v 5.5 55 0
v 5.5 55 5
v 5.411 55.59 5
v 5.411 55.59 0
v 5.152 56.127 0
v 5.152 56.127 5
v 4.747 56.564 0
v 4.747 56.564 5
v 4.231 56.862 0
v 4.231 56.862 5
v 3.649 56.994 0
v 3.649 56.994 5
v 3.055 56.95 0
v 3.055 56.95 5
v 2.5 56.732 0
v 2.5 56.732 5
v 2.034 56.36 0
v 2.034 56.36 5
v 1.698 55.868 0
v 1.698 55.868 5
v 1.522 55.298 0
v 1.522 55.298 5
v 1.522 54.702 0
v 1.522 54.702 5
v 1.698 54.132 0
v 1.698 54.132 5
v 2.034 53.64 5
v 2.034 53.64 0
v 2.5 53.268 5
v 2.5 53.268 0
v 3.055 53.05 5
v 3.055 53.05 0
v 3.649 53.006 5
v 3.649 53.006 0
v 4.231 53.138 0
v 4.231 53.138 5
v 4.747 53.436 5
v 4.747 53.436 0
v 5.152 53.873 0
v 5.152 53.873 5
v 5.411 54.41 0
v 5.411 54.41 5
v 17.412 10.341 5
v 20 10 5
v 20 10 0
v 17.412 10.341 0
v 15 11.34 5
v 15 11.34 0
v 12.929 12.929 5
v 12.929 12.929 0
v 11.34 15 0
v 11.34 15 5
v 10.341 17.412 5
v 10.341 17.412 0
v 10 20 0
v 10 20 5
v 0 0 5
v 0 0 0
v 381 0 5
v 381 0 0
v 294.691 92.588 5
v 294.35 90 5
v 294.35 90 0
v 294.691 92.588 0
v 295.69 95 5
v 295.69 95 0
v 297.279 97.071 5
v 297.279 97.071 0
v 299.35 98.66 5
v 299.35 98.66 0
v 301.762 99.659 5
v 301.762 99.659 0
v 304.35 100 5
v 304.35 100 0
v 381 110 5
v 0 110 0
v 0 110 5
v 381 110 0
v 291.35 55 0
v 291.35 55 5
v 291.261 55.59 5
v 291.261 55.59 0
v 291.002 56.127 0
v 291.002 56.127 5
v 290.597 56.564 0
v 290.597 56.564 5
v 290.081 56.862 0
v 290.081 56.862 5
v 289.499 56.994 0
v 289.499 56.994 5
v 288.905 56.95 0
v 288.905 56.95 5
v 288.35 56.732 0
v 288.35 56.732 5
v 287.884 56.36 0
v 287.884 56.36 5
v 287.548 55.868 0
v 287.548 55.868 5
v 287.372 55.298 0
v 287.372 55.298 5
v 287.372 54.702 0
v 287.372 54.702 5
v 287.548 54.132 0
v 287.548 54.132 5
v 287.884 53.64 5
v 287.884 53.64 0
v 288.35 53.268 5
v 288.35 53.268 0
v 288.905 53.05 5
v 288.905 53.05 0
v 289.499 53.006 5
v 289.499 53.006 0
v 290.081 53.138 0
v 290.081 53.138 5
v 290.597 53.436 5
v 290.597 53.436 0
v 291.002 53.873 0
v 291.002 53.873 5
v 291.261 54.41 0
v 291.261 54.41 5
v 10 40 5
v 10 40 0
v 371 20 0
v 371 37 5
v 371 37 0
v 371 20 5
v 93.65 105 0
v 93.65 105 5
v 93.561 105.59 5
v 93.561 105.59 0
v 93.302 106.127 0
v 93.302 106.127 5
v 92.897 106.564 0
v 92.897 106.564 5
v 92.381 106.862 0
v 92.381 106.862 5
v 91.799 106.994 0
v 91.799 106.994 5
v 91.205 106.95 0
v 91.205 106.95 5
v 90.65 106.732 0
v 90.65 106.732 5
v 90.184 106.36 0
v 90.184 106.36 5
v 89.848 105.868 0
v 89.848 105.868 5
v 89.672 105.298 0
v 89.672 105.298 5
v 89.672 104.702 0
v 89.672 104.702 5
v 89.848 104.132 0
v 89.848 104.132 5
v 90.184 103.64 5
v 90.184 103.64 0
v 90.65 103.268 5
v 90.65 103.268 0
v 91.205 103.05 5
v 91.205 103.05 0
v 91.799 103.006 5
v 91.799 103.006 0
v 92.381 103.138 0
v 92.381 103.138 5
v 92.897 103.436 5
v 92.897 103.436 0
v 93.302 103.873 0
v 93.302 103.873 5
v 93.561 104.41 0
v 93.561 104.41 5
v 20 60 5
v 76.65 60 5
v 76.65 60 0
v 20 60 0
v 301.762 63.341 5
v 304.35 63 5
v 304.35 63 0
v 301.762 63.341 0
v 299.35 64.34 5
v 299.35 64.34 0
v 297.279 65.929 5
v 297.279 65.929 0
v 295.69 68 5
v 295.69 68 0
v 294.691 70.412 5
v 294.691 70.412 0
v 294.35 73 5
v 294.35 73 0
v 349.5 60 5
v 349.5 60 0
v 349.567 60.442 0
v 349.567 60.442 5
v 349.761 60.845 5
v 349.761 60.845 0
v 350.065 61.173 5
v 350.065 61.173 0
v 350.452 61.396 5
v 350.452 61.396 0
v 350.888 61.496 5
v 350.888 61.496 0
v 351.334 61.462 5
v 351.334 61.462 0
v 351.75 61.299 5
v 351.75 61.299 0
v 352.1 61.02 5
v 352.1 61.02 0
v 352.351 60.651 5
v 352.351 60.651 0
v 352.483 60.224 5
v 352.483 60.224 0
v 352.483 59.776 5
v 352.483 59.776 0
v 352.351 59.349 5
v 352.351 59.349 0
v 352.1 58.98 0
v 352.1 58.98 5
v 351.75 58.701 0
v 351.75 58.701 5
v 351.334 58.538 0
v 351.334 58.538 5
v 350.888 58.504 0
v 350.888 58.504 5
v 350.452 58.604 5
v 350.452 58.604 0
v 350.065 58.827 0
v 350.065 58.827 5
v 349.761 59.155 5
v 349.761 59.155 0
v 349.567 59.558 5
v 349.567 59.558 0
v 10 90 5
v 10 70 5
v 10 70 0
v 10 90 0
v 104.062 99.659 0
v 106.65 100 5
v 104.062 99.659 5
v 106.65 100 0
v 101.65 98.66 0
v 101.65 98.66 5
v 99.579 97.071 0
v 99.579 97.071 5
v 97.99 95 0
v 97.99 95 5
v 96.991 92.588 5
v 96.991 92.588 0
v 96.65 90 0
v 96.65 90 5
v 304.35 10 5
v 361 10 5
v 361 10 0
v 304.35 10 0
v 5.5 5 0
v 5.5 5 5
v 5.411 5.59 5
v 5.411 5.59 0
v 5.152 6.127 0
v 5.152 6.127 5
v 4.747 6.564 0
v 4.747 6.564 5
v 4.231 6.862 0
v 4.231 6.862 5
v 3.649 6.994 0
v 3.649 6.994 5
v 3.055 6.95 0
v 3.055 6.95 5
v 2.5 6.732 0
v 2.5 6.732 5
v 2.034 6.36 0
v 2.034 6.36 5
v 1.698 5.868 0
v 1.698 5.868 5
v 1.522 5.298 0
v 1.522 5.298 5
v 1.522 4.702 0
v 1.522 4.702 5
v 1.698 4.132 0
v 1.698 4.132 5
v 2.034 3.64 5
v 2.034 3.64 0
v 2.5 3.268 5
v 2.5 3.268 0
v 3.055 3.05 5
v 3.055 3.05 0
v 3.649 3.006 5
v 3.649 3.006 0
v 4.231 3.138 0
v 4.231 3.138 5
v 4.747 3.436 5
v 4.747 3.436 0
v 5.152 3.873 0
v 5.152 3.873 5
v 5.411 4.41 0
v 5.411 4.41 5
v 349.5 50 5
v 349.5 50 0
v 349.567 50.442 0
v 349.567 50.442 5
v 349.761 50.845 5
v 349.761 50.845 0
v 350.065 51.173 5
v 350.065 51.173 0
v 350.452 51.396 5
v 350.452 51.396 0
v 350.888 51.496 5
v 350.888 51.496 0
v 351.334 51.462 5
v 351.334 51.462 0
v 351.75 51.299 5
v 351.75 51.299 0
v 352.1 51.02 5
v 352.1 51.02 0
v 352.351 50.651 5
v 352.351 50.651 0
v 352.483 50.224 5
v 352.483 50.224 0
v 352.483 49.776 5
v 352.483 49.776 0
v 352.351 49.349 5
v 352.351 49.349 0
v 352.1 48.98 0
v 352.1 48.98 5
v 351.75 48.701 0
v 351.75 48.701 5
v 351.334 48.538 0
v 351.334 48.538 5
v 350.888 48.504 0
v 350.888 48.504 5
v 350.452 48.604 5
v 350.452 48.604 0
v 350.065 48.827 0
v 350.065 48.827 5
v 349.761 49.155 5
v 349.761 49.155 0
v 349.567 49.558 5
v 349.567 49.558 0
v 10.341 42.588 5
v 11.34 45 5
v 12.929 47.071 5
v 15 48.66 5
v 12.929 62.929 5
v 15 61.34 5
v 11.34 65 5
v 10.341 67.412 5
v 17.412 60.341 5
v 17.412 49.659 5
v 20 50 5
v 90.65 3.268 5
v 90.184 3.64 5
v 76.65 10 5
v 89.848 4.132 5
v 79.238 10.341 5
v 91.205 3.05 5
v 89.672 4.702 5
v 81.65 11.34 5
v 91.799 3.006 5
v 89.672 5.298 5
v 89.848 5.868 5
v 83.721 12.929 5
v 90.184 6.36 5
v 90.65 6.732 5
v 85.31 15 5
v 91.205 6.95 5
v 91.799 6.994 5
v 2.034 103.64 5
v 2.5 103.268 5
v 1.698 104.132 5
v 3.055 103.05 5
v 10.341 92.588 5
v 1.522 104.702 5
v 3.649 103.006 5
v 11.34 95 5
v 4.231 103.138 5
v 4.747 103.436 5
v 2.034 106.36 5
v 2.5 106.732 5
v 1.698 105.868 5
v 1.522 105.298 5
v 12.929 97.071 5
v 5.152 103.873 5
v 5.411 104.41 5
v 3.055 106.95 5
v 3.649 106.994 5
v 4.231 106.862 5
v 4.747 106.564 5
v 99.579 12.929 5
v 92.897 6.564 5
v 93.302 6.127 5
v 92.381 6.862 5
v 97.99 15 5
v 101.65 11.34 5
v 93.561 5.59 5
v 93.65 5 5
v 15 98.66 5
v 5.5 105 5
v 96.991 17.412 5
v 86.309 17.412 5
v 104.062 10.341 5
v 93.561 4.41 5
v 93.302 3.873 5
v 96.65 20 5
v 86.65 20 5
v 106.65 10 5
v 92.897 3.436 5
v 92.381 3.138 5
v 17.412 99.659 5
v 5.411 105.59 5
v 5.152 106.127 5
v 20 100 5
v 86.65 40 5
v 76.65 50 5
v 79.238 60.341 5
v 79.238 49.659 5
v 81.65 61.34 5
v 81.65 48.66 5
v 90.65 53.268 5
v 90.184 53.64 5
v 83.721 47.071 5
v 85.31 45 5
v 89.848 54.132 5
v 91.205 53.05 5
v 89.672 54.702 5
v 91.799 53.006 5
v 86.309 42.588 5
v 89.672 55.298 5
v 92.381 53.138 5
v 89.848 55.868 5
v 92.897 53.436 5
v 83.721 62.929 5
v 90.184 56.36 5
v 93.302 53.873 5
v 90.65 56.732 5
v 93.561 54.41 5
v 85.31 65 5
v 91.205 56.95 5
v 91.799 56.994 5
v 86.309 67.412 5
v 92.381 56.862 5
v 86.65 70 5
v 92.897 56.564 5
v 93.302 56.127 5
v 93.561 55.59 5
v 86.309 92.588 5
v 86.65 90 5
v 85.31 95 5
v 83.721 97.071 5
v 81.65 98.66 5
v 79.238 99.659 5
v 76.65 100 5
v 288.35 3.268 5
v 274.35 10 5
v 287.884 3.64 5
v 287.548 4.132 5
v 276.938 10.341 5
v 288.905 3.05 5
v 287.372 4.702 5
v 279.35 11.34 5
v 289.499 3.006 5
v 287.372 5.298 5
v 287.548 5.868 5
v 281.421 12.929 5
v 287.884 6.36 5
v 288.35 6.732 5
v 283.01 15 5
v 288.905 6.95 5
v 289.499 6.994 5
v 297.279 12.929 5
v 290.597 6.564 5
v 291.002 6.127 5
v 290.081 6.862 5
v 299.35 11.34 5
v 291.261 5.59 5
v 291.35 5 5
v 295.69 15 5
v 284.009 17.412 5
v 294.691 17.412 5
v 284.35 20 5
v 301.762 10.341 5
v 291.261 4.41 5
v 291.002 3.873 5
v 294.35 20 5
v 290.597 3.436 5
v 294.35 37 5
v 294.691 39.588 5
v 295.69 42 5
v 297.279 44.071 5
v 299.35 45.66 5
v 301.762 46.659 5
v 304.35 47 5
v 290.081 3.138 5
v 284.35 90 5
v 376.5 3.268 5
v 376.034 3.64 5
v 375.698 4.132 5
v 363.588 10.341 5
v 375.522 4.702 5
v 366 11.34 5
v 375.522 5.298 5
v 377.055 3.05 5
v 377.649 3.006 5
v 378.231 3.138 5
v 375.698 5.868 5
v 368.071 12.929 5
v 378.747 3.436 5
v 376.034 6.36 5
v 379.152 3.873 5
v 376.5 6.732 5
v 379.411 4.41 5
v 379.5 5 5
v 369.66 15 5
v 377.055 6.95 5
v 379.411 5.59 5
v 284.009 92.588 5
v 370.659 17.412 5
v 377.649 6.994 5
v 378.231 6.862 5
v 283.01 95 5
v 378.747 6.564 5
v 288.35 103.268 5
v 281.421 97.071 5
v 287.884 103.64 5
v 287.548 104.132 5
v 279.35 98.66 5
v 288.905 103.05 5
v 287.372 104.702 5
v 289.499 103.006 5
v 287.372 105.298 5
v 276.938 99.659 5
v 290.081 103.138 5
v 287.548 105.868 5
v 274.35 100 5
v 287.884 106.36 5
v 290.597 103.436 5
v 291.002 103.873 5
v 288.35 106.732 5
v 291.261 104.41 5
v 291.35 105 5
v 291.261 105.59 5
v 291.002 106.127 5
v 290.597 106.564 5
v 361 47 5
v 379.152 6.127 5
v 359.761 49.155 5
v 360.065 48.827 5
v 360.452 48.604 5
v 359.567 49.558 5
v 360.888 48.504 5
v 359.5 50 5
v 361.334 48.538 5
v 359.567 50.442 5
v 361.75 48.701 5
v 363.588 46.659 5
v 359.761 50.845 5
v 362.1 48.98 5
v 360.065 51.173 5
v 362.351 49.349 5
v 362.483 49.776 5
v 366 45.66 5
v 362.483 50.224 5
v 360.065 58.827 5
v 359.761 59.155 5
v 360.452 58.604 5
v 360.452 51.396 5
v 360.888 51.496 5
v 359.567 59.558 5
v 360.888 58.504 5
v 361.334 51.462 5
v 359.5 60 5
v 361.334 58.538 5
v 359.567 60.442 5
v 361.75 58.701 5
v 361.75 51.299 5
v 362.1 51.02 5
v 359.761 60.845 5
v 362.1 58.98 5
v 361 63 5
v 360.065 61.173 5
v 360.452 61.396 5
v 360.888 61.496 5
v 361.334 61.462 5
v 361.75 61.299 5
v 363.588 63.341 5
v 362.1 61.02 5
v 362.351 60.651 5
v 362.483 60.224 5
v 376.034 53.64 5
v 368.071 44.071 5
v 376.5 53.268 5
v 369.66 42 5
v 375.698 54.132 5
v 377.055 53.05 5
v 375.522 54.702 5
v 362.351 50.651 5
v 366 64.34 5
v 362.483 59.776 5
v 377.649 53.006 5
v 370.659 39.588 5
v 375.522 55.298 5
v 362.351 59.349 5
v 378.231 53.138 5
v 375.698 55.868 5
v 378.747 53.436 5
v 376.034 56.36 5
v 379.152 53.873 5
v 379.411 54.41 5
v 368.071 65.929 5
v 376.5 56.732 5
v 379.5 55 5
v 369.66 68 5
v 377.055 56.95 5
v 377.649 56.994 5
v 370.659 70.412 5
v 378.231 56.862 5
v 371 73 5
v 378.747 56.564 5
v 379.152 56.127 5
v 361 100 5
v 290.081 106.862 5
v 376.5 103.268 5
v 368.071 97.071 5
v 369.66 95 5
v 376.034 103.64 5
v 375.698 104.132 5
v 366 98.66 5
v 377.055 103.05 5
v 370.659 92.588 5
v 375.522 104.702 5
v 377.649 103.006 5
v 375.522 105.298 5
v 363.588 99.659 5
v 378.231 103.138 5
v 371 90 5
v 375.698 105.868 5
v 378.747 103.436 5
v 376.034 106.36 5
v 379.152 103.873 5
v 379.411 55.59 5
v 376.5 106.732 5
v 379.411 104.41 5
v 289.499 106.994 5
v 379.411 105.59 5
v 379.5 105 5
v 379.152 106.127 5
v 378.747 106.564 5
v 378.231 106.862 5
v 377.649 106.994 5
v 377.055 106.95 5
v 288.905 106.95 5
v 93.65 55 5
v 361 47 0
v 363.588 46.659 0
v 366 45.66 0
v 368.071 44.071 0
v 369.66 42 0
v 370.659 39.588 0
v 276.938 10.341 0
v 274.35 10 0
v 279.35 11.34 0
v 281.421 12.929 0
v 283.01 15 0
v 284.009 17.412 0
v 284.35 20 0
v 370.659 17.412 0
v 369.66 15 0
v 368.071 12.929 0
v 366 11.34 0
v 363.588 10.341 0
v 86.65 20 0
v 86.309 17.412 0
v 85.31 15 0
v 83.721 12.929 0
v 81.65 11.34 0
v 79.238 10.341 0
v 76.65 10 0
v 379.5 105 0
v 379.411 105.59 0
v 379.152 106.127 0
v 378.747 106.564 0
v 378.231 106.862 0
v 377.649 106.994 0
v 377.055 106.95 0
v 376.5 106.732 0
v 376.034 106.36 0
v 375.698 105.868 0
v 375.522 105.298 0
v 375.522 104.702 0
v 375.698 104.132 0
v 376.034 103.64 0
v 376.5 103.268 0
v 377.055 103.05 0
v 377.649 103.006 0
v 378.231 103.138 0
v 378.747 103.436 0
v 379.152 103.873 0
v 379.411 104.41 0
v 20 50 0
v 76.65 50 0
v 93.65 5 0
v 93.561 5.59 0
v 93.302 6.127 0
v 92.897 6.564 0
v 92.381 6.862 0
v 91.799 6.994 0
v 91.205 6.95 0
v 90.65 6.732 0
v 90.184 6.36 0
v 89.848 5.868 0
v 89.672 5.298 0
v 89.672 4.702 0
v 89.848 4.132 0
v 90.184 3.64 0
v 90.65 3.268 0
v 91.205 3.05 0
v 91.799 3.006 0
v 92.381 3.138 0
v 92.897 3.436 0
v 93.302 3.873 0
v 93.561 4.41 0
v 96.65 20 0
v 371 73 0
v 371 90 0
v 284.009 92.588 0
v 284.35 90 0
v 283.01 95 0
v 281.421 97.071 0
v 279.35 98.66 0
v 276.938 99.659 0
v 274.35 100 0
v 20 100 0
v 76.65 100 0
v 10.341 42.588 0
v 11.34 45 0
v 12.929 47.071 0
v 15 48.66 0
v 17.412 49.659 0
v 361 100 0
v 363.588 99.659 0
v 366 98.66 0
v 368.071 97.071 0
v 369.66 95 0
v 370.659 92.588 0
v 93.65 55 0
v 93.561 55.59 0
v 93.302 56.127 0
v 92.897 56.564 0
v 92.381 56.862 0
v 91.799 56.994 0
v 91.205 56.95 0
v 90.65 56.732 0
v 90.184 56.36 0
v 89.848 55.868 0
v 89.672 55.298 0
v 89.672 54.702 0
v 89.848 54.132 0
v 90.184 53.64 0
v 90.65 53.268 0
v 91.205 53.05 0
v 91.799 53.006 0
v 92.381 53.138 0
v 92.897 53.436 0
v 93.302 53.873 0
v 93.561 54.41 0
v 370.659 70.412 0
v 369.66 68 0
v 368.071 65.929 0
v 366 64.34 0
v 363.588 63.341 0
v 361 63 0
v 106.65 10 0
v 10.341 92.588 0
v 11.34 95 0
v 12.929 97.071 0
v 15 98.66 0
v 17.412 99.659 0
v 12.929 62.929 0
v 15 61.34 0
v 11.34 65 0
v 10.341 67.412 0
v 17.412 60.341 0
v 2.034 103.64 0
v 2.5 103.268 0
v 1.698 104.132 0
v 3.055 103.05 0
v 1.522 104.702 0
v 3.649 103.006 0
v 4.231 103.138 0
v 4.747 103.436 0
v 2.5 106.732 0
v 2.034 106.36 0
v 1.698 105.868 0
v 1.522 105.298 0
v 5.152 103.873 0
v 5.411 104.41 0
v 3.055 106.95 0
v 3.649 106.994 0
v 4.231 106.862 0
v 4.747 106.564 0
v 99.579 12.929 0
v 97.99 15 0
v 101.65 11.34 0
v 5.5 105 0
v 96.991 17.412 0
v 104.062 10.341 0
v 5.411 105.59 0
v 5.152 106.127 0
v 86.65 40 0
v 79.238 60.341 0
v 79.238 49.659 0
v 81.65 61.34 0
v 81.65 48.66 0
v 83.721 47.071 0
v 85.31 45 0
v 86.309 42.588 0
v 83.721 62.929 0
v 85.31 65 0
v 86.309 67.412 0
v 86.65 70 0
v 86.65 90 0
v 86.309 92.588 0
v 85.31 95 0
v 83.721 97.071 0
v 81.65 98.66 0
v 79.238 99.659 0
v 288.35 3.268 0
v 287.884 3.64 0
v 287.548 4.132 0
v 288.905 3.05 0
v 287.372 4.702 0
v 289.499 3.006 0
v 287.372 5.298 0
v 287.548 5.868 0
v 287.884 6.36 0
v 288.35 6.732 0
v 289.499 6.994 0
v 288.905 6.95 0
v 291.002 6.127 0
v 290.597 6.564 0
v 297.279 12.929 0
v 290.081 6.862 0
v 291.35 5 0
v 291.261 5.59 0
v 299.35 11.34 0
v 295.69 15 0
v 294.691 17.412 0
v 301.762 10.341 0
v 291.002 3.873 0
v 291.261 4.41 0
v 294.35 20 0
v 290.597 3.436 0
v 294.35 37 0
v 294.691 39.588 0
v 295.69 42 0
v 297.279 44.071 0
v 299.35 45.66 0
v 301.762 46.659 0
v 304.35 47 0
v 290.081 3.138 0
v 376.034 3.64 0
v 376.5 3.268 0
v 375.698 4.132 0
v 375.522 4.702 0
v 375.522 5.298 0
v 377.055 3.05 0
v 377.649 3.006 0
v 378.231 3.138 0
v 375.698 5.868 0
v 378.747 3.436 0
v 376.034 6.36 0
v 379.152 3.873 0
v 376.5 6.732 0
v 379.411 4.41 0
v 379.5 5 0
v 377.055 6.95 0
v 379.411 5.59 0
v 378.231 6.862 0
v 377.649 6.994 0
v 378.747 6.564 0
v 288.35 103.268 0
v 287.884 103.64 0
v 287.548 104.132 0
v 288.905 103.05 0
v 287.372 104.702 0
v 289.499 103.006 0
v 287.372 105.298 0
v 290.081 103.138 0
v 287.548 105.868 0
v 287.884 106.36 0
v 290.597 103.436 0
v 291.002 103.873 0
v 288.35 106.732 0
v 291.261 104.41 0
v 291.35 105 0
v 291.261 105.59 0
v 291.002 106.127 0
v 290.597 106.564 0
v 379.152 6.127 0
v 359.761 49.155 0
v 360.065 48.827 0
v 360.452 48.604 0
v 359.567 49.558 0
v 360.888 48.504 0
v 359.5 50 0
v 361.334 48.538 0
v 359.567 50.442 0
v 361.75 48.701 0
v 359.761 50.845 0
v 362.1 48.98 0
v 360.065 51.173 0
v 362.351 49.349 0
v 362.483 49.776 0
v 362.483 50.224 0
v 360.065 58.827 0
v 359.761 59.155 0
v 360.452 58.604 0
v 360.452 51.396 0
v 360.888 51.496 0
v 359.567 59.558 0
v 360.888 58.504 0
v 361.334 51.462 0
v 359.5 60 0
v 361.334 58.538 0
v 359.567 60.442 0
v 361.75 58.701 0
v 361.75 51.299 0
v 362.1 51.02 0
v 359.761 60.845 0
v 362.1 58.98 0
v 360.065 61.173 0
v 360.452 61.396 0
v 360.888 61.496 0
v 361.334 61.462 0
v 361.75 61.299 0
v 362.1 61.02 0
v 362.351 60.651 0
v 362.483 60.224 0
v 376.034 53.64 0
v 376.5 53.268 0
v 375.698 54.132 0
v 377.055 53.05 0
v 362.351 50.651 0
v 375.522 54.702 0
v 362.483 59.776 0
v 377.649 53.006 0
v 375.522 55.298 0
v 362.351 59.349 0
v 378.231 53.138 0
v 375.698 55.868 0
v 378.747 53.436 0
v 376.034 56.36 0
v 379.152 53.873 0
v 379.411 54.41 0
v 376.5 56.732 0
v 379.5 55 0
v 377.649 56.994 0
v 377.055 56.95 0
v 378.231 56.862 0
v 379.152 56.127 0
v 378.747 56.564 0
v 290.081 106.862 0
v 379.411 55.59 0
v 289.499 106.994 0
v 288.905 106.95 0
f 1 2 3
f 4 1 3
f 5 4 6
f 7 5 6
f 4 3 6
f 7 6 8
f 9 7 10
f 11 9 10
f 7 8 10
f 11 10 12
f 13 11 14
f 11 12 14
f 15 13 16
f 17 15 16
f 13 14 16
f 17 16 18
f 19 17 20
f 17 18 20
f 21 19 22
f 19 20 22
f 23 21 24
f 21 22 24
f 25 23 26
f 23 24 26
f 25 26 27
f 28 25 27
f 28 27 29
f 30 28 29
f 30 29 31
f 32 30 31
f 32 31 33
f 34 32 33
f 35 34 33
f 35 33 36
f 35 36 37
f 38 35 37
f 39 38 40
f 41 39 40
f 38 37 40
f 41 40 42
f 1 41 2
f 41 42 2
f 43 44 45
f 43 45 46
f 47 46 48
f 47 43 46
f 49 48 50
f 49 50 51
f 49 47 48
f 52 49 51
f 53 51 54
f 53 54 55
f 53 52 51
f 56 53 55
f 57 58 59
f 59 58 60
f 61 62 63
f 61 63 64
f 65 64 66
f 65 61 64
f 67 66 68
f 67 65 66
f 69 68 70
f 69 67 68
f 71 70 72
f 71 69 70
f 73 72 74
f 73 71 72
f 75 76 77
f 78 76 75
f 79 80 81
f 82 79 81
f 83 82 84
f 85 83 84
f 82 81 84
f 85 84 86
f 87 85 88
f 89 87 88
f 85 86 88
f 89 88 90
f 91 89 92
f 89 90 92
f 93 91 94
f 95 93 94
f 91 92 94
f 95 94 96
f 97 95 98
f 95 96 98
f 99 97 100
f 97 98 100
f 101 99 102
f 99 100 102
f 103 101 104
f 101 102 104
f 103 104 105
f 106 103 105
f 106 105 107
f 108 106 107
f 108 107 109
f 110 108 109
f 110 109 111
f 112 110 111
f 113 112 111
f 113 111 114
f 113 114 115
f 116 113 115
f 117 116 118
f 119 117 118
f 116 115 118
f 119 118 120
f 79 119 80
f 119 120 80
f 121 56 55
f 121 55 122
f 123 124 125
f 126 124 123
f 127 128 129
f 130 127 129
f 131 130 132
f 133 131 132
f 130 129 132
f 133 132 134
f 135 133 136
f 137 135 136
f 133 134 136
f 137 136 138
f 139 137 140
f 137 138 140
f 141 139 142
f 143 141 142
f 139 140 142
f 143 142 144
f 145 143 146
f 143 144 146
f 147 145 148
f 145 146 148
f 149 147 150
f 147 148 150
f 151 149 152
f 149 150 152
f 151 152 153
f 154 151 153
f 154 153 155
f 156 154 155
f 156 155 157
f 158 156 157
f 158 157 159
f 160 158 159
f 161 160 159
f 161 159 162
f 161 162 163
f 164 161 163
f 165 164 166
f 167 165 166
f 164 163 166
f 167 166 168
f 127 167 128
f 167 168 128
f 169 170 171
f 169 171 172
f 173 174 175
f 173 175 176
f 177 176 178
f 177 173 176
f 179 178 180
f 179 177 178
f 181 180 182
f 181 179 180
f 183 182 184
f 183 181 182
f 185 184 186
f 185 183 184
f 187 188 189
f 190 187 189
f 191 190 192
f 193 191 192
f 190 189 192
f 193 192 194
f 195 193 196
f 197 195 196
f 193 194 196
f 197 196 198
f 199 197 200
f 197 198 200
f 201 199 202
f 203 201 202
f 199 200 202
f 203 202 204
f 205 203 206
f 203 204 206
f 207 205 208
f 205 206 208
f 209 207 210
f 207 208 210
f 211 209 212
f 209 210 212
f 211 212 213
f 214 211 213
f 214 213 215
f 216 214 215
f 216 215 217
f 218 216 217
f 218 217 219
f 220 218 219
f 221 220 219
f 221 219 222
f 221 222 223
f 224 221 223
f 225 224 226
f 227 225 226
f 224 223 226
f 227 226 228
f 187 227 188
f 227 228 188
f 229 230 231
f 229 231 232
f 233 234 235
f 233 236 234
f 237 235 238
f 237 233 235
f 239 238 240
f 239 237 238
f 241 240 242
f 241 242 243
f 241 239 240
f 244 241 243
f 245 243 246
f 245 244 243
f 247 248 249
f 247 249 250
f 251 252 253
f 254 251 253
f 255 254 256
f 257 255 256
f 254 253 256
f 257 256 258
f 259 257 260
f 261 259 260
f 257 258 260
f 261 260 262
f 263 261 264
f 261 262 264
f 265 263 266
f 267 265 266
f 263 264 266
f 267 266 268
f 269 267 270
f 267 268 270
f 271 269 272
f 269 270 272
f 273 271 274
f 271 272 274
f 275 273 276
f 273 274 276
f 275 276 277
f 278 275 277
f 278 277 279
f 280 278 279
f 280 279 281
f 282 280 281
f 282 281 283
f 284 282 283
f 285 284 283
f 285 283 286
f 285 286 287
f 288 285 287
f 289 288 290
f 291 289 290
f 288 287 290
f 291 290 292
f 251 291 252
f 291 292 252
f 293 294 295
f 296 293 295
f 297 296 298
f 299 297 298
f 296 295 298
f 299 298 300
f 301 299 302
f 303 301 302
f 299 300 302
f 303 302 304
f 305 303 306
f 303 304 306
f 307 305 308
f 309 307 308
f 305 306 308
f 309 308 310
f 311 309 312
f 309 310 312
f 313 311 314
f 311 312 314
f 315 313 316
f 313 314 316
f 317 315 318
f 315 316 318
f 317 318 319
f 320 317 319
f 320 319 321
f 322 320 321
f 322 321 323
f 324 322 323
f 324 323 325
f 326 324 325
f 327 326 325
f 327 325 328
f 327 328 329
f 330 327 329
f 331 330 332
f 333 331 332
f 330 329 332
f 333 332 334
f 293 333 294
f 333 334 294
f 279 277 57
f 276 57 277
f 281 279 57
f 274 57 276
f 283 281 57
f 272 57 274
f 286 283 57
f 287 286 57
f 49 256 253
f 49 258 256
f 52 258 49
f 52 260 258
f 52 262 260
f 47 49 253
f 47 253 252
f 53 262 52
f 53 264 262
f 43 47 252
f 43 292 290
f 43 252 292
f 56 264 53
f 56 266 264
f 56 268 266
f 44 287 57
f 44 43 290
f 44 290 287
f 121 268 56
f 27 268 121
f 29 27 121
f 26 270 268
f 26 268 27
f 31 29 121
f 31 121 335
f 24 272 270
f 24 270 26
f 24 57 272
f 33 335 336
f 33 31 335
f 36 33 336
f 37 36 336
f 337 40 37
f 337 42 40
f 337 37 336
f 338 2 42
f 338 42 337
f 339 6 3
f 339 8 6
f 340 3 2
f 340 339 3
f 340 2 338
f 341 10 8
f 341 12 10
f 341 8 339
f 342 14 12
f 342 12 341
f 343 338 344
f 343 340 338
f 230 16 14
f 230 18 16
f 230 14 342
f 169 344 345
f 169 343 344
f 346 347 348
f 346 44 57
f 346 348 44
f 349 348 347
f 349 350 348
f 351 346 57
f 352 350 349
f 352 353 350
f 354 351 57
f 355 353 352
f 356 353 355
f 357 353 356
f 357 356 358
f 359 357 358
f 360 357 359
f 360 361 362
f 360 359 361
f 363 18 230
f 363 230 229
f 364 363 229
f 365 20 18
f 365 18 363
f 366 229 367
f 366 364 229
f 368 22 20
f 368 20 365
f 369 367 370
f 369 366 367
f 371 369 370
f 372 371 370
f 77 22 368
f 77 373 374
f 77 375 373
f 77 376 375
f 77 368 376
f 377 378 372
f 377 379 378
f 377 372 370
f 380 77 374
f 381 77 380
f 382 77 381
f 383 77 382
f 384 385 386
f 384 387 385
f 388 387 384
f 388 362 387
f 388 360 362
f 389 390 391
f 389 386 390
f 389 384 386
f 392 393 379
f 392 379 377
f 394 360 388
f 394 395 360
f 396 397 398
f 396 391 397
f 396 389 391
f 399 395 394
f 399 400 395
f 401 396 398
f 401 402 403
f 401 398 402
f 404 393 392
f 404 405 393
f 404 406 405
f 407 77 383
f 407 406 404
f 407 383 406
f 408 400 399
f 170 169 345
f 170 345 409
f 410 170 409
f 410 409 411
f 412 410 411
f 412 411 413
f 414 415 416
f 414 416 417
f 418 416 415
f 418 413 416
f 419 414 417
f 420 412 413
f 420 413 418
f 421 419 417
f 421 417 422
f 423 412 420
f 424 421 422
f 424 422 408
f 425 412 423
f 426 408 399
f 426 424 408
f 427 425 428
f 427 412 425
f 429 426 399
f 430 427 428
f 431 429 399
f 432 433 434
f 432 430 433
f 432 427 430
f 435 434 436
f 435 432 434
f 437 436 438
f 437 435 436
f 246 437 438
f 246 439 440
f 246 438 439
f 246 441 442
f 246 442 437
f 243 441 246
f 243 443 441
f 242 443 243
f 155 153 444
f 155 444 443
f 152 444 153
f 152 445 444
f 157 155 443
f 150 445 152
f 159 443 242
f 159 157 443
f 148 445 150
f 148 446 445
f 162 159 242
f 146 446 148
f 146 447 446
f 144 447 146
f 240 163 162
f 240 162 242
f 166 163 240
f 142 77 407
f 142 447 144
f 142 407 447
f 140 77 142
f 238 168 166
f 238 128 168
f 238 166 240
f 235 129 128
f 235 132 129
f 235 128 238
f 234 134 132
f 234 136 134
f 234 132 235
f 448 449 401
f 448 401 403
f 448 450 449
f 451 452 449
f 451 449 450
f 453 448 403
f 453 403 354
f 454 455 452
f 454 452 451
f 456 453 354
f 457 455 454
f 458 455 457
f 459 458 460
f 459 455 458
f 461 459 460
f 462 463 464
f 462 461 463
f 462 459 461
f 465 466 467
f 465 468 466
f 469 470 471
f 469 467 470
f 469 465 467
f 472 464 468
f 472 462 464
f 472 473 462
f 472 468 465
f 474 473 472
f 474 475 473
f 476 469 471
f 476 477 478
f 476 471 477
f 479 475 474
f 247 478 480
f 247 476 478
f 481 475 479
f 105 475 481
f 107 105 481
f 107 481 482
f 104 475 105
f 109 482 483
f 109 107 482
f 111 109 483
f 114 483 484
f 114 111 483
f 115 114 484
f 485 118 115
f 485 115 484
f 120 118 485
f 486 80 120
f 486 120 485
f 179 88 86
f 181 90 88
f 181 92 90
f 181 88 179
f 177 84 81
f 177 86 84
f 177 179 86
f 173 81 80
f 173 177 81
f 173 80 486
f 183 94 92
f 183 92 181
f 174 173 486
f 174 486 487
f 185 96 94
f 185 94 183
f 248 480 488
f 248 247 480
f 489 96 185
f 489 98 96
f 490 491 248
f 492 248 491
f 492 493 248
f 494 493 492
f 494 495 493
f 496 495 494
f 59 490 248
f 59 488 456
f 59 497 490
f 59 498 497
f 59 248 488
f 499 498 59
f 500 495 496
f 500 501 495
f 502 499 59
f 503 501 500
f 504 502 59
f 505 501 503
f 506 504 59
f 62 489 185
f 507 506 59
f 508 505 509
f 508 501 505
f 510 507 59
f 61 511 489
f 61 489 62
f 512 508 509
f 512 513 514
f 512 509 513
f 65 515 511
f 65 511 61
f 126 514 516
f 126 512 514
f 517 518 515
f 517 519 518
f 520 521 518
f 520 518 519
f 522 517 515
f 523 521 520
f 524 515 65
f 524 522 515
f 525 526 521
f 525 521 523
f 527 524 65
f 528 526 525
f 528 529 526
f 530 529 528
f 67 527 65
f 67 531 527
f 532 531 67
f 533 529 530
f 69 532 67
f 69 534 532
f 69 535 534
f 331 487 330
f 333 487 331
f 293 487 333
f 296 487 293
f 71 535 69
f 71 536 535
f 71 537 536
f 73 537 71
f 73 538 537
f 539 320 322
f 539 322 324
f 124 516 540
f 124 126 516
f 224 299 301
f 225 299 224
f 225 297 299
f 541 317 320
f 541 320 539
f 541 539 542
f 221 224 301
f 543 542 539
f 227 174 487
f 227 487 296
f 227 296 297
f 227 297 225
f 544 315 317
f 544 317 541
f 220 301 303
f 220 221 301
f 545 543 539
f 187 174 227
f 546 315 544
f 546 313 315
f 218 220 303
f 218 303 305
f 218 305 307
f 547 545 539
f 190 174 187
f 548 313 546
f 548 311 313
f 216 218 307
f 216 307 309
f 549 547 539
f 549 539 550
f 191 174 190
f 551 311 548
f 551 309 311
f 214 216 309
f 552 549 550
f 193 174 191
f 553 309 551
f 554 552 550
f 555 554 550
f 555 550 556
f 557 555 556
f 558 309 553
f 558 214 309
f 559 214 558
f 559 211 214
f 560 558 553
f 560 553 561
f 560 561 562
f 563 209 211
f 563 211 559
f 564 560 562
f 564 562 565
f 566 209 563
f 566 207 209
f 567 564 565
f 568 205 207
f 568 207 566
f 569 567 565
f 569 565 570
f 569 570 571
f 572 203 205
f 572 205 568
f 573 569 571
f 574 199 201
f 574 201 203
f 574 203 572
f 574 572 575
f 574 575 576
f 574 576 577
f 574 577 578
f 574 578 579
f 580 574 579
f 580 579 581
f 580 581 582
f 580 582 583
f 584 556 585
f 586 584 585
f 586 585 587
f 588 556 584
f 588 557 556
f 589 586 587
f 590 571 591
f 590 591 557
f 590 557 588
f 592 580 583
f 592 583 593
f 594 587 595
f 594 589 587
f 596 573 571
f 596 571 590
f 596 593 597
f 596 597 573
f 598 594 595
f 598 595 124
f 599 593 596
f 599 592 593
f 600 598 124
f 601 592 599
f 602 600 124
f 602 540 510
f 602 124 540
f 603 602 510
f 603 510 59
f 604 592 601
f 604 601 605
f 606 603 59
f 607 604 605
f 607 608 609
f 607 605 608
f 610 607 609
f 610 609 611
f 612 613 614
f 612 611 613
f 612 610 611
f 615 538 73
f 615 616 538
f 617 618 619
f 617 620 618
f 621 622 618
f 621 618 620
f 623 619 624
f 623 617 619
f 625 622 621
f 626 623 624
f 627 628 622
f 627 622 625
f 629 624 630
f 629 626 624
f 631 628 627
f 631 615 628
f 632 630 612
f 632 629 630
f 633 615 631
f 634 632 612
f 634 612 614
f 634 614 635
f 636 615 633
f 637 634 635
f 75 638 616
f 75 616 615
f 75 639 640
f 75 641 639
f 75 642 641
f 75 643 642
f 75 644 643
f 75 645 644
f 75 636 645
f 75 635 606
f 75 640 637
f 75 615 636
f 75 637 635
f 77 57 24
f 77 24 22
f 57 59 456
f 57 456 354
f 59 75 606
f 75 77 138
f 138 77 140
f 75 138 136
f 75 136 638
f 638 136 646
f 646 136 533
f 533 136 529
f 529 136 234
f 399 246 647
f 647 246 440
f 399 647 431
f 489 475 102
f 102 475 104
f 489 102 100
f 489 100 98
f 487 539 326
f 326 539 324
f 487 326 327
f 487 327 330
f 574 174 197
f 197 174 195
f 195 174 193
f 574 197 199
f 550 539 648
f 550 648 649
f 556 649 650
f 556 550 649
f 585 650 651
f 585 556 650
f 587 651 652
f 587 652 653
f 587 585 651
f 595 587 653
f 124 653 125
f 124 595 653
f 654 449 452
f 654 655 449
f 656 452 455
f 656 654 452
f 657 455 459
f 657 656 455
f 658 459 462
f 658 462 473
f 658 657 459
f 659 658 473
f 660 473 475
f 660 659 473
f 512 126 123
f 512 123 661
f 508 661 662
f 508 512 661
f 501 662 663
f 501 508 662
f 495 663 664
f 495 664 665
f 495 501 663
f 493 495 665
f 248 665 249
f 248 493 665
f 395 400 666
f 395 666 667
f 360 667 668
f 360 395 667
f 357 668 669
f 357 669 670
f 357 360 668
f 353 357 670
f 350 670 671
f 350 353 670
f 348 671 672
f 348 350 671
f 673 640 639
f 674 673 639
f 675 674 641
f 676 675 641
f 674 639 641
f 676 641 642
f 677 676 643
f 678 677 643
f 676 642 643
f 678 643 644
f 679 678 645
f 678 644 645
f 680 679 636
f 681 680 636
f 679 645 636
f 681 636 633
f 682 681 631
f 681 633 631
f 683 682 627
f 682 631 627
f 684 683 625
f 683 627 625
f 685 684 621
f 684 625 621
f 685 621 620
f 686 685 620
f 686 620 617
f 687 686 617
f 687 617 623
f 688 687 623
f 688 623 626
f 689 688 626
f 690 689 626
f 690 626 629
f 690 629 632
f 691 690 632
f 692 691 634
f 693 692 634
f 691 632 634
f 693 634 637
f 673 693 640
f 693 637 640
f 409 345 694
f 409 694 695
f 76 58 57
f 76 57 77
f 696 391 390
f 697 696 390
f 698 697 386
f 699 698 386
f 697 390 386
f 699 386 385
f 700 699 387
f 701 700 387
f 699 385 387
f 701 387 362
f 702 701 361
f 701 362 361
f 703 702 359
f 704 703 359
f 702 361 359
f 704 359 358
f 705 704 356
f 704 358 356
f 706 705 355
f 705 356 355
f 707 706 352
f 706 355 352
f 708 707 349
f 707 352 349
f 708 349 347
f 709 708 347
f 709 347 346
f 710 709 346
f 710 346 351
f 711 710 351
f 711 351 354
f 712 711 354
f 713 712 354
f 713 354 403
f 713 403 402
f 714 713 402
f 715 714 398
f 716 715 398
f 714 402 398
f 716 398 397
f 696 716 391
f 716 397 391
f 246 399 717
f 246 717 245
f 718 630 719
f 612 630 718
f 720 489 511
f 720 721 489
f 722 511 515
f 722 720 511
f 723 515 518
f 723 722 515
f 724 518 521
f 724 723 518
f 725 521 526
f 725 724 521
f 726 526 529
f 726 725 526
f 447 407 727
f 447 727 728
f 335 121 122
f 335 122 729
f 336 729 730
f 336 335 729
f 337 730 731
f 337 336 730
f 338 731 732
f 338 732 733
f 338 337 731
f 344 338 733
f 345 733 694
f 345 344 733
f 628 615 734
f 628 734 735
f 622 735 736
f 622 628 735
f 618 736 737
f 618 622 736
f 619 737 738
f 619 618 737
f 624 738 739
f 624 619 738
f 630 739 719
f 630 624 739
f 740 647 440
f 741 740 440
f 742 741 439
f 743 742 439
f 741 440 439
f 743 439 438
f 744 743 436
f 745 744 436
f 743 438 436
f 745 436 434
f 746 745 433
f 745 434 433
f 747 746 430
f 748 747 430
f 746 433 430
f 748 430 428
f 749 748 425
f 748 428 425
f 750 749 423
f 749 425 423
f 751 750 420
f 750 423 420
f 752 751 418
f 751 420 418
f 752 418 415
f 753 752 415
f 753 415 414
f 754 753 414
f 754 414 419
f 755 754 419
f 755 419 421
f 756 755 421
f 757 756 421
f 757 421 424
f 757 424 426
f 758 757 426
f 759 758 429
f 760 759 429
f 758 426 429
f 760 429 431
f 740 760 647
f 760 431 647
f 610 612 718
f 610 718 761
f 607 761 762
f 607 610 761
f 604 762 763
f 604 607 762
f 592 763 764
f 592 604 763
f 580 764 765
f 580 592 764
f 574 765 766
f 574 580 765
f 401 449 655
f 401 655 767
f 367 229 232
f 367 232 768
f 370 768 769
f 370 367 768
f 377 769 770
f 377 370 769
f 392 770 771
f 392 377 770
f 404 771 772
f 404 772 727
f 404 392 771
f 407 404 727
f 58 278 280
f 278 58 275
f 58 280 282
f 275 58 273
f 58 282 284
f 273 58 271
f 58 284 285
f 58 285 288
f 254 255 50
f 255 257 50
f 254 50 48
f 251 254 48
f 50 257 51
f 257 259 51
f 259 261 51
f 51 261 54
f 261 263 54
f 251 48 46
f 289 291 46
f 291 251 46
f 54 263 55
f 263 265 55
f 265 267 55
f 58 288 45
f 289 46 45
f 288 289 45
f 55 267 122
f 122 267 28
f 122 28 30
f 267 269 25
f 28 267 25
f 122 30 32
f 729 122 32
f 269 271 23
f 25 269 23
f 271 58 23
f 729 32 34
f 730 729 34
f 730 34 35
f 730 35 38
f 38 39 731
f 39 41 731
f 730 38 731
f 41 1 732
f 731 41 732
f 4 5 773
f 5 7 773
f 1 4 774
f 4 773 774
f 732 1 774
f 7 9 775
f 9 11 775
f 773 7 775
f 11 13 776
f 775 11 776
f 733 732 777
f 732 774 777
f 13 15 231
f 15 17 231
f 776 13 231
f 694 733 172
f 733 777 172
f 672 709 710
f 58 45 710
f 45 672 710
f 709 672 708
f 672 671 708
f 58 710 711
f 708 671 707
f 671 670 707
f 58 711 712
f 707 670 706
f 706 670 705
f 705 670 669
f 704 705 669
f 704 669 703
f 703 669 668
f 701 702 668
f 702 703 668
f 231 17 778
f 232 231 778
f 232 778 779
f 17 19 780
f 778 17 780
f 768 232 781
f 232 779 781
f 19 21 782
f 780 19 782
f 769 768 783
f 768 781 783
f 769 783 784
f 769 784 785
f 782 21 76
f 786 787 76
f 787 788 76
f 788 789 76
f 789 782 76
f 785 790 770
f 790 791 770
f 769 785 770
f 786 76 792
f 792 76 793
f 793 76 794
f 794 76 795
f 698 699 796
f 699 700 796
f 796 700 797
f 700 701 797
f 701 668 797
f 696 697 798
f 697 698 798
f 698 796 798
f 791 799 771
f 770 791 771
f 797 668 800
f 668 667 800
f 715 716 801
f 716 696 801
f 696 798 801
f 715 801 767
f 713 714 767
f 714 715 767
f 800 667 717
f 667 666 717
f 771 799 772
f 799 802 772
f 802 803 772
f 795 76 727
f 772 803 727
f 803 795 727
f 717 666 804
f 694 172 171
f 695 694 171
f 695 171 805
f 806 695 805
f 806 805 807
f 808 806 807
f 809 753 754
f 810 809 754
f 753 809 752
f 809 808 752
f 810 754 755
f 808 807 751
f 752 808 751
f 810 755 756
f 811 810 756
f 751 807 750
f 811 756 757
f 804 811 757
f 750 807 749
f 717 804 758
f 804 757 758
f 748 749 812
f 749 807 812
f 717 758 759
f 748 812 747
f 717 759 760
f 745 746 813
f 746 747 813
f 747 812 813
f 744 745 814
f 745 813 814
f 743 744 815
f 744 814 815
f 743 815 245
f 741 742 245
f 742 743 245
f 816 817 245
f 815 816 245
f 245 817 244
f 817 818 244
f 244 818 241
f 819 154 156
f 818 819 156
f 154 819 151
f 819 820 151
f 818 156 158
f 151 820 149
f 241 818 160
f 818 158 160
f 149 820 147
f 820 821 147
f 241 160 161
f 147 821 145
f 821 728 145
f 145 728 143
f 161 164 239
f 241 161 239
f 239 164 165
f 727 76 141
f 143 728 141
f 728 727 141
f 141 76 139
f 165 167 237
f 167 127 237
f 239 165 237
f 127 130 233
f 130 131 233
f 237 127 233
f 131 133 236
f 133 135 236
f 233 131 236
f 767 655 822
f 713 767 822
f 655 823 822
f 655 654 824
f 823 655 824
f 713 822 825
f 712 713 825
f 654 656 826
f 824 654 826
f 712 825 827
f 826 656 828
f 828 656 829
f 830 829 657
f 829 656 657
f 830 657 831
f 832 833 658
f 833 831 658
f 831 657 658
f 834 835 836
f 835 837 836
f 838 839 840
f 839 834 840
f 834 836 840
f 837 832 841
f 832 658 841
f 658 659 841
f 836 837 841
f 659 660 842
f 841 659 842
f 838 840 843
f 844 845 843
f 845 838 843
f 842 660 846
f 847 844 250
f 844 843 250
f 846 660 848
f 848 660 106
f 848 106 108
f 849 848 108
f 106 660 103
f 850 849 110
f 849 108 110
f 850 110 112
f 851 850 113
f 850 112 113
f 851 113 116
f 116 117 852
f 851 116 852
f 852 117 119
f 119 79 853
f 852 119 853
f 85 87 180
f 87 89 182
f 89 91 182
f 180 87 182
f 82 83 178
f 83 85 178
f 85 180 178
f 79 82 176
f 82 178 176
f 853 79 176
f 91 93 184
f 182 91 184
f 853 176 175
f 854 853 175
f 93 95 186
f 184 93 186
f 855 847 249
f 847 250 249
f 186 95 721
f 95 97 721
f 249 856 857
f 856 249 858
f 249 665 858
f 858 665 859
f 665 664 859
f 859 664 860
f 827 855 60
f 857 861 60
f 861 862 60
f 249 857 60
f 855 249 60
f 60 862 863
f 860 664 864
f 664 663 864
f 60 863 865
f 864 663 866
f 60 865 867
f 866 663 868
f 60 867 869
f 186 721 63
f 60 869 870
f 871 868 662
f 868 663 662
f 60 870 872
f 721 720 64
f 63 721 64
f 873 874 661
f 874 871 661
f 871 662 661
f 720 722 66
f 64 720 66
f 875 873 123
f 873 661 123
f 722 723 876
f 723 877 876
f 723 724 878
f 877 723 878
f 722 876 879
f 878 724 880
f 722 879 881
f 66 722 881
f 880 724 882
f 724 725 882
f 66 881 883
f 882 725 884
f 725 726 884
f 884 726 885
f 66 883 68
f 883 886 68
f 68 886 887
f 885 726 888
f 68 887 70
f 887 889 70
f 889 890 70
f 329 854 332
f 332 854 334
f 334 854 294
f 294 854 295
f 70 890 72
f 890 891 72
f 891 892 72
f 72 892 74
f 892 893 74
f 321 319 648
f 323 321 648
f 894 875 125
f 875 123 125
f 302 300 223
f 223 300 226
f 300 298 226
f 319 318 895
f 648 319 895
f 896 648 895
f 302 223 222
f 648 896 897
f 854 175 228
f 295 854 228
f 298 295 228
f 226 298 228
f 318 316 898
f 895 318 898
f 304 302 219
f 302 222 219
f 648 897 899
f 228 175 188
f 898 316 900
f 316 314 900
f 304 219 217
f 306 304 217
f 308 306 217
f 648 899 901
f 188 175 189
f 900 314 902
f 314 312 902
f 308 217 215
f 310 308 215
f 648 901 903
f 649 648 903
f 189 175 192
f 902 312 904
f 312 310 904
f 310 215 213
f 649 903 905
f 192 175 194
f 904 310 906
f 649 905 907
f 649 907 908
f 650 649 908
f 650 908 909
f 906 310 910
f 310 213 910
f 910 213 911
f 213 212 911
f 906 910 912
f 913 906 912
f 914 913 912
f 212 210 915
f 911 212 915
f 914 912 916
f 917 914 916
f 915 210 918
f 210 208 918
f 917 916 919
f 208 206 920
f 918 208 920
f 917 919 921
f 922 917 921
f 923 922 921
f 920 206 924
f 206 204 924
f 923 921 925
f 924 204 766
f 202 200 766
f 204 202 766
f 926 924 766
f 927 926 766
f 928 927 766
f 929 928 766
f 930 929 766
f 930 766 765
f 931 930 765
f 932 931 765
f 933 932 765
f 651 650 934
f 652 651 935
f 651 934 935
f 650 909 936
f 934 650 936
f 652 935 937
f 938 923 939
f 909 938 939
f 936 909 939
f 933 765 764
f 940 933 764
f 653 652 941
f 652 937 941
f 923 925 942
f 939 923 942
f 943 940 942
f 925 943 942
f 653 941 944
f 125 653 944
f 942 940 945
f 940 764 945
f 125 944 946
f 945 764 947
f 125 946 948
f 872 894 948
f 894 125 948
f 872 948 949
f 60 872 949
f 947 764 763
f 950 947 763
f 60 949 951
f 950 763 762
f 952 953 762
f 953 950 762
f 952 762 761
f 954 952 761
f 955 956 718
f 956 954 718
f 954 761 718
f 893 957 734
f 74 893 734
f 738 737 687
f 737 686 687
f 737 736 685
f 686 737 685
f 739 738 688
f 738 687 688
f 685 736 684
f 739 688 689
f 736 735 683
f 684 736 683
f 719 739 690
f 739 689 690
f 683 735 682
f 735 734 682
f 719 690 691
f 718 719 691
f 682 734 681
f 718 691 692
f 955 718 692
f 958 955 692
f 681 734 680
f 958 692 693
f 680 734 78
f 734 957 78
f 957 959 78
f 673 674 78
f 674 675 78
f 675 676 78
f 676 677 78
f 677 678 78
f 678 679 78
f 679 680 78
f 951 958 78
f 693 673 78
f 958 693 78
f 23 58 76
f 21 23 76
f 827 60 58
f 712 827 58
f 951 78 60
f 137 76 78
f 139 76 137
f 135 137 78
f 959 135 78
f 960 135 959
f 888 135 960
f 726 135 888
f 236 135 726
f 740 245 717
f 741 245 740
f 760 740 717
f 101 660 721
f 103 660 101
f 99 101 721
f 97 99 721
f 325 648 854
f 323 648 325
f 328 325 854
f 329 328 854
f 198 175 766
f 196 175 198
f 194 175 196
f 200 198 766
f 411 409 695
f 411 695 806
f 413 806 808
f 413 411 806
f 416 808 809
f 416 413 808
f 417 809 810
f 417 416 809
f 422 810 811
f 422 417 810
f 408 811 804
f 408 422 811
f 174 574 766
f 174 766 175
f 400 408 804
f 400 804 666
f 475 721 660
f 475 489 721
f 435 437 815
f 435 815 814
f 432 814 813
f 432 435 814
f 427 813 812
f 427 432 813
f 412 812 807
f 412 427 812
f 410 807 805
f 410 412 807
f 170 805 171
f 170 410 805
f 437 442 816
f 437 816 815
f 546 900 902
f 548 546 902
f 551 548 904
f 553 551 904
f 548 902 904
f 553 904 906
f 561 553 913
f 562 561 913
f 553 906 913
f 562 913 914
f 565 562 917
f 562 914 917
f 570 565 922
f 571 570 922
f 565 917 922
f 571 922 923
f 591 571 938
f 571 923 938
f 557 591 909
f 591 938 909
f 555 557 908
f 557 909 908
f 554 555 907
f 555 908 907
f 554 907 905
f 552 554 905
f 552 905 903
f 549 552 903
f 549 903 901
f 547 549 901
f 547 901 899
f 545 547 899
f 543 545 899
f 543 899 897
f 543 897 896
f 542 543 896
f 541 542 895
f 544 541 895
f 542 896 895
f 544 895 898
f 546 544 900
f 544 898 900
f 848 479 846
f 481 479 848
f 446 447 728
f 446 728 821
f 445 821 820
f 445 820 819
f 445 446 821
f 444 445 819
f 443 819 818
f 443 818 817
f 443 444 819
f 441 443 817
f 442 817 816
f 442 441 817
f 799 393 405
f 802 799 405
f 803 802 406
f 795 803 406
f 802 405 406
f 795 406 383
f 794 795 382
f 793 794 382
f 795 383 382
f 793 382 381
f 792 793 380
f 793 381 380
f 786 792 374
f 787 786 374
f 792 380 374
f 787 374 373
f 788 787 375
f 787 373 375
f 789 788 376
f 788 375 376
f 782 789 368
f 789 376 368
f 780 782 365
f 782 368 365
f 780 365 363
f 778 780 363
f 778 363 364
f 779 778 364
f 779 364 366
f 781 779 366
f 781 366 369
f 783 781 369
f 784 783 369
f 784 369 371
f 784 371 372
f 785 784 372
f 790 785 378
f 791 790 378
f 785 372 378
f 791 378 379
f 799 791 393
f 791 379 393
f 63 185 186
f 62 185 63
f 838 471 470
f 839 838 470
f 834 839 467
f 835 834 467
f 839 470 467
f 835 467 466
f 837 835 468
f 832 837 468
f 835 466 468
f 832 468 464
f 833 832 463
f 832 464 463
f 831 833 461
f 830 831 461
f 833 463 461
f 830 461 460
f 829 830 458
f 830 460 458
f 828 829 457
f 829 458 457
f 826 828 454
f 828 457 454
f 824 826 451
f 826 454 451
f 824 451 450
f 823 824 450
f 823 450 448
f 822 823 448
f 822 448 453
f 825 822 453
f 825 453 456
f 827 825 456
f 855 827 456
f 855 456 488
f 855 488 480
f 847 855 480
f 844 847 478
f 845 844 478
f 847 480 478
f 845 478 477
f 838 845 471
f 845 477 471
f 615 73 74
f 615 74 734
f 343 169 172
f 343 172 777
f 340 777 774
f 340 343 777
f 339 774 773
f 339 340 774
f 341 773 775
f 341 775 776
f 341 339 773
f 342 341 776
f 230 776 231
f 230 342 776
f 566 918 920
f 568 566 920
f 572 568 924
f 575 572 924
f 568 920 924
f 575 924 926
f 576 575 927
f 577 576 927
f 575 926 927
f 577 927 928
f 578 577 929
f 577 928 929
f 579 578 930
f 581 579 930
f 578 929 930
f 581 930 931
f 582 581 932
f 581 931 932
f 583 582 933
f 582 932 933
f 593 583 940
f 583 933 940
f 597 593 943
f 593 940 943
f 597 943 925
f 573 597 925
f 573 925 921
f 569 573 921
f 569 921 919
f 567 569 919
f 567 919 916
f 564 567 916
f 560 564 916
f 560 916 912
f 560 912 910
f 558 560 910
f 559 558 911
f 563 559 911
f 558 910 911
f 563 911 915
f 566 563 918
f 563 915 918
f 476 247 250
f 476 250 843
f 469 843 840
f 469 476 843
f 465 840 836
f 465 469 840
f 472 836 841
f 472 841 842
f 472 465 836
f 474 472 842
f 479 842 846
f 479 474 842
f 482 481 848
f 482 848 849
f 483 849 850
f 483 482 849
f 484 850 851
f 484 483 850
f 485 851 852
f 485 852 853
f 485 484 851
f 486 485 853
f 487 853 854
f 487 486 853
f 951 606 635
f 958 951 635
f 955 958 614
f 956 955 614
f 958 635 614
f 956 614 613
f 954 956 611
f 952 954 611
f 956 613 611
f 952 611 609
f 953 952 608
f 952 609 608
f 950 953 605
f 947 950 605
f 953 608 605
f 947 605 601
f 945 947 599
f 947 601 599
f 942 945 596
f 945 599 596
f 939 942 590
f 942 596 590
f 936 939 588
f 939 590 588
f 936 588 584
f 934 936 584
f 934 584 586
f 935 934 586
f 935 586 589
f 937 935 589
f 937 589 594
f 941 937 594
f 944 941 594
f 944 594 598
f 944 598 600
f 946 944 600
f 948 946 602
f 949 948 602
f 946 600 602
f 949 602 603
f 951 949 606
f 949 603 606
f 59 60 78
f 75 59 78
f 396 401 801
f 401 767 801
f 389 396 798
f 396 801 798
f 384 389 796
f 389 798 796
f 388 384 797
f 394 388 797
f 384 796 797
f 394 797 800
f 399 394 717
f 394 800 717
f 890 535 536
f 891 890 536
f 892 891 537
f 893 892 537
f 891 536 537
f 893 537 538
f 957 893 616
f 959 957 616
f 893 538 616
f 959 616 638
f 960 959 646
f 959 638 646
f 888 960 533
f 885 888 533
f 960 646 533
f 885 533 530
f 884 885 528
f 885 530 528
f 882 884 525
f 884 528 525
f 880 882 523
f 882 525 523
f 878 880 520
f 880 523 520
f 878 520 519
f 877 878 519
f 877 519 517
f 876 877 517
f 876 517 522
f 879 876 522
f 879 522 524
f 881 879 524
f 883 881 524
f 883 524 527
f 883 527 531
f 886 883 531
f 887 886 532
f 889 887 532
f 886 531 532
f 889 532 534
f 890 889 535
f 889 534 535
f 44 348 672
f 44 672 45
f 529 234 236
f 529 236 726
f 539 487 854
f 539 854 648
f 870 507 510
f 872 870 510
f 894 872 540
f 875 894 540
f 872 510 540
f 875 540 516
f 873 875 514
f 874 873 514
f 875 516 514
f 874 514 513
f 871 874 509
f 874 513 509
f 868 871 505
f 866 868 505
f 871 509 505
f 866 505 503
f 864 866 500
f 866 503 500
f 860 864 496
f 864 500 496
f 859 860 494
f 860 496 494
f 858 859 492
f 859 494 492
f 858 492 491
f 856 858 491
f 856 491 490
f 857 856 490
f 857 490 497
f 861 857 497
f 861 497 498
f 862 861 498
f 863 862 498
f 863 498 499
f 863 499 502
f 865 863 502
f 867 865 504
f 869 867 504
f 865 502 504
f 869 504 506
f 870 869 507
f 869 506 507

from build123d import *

# Parameters (mm, degrees)
SKETCH_1_W          = 381
SKETCH_1_H          = 110
EXTRUDE_1_DEPTH     = 5
SKETCH_2_R          = 2
CUT_EXTRUDE_1_DEPTH = 5
CUT_EXTRUDE_2_DEPTH = 5
SKETCH_6_R          = 1.5
CUT_EXTRUDE_3_DEPTH = 5
CUT_EXTRUDE_4_DEPTH = 10
FILLET_1_R          = 10


with BuildPart() as part:
    # 草图1 → 凸台-拉伸1 (new body)
    with BuildSketch(Plane.XY):
        with Locations((190.5, 55)):
            Rectangle(SKETCH_1_W, SKETCH_1_H)
    extrude(amount=EXTRUDE_1_DEPTH)

    # 草图2 → 切除-拉伸1 (cut)
    with BuildSketch(Plane.XY.offset(5)):
        with Locations((3.5, 105)):
            Circle(SKETCH_2_R)
        with Locations((3.5, 55)):
            Circle(SKETCH_2_R)
        with Locations((3.5, 5)):
            Circle(SKETCH_2_R)
        with Locations((377.5, 105)):
            Circle(SKETCH_2_R)
        with Locations((377.5, 55)):
            Circle(SKETCH_2_R)
        with Locations((377.5, 5)):
            Circle(SKETCH_2_R)
        with Locations((91.65, 105)):
            Circle(SKETCH_2_R)
        with Locations((91.65, 55)):
            Circle(SKETCH_2_R)
        with Locations((91.65, 5)):
            Circle(SKETCH_2_R)
        with Locations((289.35, 105)):
            Circle(SKETCH_2_R)
        with Locations((289.35, 55)):
            Circle(SKETCH_2_R)
        with Locations((289.35, 5)):
            Circle(SKETCH_2_R)
    extrude(amount=-CUT_EXTRUDE_1_DEPTH, mode=Mode.SUBTRACT)

    # 草图3 → 切除-拉伸2 (cut)
    with BuildSketch(Plane.XY.offset(5)):
        with BuildLine():
            Line((20, 100), (76.65, 100))
            ThreePointArc((76.65, 100), (83.721067812, 97.071067812), (86.65, 90))
            Line((86.65, 90), (86.65, 70))
            ThreePointArc((86.65, 70), (83.721067812, 62.928932188), (76.65, 60))
            Line((76.65, 60), (20, 60))
            ThreePointArc((20, 60), (12.928932188, 62.928932188), (10, 70))
            Line((10, 70), (10, 90))
            ThreePointArc((10, 90), (12.928932188, 97.071067812), (20, 100))
        make_face()
        with BuildLine():
            Line((20, 50), (76.65, 50))
            ThreePointArc((76.65, 50), (83.721067812, 47.071067812), (86.65, 40))
            Line((86.65, 40), (86.65, 20))
            ThreePointArc((86.65, 20), (83.721067812, 12.928932188), (76.65, 10))
            Line((76.65, 10), (20, 10))
            ThreePointArc((20, 10), (12.928932188, 12.928932188), (10, 20))
            Line((10, 20), (10, 40))
            ThreePointArc((10, 40), (12.928932188, 47.071067812), (20, 50))
        make_face()
        with BuildLine():
            Line((106.65, 100), (274.35, 100))
            ThreePointArc((274.35, 100), (281.421067812, 97.071067812), (284.35, 90))
            Line((284.35, 90), (284.35, 70))
            ThreePointArc((284.35, 70), (281.421067812, 62.928932188), (274.35, 60))
            Line((274.35, 60), (106.65, 60))
            ThreePointArc((106.65, 60), (99.578932188, 62.928932188), (96.65, 70))
            Line((96.65, 70), (96.65, 90))
            ThreePointArc((96.65, 90), (99.578932188, 97.071067812), (106.65, 100))
        make_face()
        with BuildLine():
            Line((106.65, 50), (274.35, 50))
            ThreePointArc((274.35, 50), (281.421067812, 47.071067812), (284.35, 40))
            Line((284.35, 40), (284.35, 20))
            ThreePointArc((284.35, 20), (281.421067812, 12.928932188), (274.35, 10))
            Line((274.35, 10), (106.65, 10))
            ThreePointArc((106.65, 10), (99.578932188, 12.928932188), (96.65, 20))
            Line((96.65, 20), (96.65, 40))
            ThreePointArc((96.65, 40), (99.578932188, 47.071067812), (106.65, 50))
        make_face()
        with BuildLine():
            Line((304.35, 100), (361, 100))
            ThreePointArc((361, 100), (368.071067812, 97.071067812), (371, 90))
            Line((371, 90), (371, 73))
            ThreePointArc((371, 73), (368.071067812, 65.928932188), (361, 63))
            Line((361, 63), (304.35, 63))
            ThreePointArc((304.35, 63), (297.278932188, 65.928932188), (294.35, 73))
            Line((294.35, 73), (294.35, 90))
            ThreePointArc((294.35, 90), (297.278932188, 97.071067812), (304.35, 100))
        make_face()
        with BuildLine():
            Line((304.35, 47), (361, 47))
            ThreePointArc((361, 47), (368.071067812, 44.071067812), (371, 37))
            Line((371, 37), (371, 20))
            ThreePointArc((371, 20), (368.071067812, 12.928932188), (361, 10))
            Line((361, 10), (304.35, 10))
            ThreePointArc((304.35, 10), (297.278932188, 12.928932188), (294.35, 20))
            Line((294.35, 20), (294.35, 37))
            ThreePointArc((294.35, 37), (297.278932188, 44.071067812), (304.35, 47))
        make_face()
    extrude(amount=-CUT_EXTRUDE_2_DEPTH, mode=Mode.SUBTRACT)

    # 草图6 → 切除-拉伸3 (cut)
    with BuildSketch(Plane(origin=(0, 0, 0), x_dir=(-1, 0, 0), z_dir=(0, 0, -1))):
        with Locations((-361, 60)):
            Circle(SKETCH_6_R)
        with Locations((-351, 60)):
            Circle(SKETCH_6_R)
        with Locations((-361, 50)):
            Circle(SKETCH_6_R)
        with Locations((-351, 50)):
            Circle(SKETCH_6_R)
    extrude(amount=-CUT_EXTRUDE_3_DEPTH, mode=Mode.SUBTRACT)

    # 草图7 → 切除-拉伸4 (cut)
    with BuildSketch(Plane.XY.offset(5)):
        Polygon((96.65, 90), (96.65, 100), (284.35, 100), (284.35, 10), (96.65, 10), align=None)
    extrude(amount=-CUT_EXTRUDE_4_DEPTH, mode=Mode.SUBTRACT)

    # 圆角1
    fillet_1_edges = [part.edges().sort_by_distance(p)[0] for p in [
        (96.65, 100, 2.5),
        (96.65, 10, 2.5),
        (284.35, 100, 2.5),
        (284.35, 10, 2.5),
    ]]
    fillet(fillet_1_edges, radius=FILLET_1_R)


solid = part.part
